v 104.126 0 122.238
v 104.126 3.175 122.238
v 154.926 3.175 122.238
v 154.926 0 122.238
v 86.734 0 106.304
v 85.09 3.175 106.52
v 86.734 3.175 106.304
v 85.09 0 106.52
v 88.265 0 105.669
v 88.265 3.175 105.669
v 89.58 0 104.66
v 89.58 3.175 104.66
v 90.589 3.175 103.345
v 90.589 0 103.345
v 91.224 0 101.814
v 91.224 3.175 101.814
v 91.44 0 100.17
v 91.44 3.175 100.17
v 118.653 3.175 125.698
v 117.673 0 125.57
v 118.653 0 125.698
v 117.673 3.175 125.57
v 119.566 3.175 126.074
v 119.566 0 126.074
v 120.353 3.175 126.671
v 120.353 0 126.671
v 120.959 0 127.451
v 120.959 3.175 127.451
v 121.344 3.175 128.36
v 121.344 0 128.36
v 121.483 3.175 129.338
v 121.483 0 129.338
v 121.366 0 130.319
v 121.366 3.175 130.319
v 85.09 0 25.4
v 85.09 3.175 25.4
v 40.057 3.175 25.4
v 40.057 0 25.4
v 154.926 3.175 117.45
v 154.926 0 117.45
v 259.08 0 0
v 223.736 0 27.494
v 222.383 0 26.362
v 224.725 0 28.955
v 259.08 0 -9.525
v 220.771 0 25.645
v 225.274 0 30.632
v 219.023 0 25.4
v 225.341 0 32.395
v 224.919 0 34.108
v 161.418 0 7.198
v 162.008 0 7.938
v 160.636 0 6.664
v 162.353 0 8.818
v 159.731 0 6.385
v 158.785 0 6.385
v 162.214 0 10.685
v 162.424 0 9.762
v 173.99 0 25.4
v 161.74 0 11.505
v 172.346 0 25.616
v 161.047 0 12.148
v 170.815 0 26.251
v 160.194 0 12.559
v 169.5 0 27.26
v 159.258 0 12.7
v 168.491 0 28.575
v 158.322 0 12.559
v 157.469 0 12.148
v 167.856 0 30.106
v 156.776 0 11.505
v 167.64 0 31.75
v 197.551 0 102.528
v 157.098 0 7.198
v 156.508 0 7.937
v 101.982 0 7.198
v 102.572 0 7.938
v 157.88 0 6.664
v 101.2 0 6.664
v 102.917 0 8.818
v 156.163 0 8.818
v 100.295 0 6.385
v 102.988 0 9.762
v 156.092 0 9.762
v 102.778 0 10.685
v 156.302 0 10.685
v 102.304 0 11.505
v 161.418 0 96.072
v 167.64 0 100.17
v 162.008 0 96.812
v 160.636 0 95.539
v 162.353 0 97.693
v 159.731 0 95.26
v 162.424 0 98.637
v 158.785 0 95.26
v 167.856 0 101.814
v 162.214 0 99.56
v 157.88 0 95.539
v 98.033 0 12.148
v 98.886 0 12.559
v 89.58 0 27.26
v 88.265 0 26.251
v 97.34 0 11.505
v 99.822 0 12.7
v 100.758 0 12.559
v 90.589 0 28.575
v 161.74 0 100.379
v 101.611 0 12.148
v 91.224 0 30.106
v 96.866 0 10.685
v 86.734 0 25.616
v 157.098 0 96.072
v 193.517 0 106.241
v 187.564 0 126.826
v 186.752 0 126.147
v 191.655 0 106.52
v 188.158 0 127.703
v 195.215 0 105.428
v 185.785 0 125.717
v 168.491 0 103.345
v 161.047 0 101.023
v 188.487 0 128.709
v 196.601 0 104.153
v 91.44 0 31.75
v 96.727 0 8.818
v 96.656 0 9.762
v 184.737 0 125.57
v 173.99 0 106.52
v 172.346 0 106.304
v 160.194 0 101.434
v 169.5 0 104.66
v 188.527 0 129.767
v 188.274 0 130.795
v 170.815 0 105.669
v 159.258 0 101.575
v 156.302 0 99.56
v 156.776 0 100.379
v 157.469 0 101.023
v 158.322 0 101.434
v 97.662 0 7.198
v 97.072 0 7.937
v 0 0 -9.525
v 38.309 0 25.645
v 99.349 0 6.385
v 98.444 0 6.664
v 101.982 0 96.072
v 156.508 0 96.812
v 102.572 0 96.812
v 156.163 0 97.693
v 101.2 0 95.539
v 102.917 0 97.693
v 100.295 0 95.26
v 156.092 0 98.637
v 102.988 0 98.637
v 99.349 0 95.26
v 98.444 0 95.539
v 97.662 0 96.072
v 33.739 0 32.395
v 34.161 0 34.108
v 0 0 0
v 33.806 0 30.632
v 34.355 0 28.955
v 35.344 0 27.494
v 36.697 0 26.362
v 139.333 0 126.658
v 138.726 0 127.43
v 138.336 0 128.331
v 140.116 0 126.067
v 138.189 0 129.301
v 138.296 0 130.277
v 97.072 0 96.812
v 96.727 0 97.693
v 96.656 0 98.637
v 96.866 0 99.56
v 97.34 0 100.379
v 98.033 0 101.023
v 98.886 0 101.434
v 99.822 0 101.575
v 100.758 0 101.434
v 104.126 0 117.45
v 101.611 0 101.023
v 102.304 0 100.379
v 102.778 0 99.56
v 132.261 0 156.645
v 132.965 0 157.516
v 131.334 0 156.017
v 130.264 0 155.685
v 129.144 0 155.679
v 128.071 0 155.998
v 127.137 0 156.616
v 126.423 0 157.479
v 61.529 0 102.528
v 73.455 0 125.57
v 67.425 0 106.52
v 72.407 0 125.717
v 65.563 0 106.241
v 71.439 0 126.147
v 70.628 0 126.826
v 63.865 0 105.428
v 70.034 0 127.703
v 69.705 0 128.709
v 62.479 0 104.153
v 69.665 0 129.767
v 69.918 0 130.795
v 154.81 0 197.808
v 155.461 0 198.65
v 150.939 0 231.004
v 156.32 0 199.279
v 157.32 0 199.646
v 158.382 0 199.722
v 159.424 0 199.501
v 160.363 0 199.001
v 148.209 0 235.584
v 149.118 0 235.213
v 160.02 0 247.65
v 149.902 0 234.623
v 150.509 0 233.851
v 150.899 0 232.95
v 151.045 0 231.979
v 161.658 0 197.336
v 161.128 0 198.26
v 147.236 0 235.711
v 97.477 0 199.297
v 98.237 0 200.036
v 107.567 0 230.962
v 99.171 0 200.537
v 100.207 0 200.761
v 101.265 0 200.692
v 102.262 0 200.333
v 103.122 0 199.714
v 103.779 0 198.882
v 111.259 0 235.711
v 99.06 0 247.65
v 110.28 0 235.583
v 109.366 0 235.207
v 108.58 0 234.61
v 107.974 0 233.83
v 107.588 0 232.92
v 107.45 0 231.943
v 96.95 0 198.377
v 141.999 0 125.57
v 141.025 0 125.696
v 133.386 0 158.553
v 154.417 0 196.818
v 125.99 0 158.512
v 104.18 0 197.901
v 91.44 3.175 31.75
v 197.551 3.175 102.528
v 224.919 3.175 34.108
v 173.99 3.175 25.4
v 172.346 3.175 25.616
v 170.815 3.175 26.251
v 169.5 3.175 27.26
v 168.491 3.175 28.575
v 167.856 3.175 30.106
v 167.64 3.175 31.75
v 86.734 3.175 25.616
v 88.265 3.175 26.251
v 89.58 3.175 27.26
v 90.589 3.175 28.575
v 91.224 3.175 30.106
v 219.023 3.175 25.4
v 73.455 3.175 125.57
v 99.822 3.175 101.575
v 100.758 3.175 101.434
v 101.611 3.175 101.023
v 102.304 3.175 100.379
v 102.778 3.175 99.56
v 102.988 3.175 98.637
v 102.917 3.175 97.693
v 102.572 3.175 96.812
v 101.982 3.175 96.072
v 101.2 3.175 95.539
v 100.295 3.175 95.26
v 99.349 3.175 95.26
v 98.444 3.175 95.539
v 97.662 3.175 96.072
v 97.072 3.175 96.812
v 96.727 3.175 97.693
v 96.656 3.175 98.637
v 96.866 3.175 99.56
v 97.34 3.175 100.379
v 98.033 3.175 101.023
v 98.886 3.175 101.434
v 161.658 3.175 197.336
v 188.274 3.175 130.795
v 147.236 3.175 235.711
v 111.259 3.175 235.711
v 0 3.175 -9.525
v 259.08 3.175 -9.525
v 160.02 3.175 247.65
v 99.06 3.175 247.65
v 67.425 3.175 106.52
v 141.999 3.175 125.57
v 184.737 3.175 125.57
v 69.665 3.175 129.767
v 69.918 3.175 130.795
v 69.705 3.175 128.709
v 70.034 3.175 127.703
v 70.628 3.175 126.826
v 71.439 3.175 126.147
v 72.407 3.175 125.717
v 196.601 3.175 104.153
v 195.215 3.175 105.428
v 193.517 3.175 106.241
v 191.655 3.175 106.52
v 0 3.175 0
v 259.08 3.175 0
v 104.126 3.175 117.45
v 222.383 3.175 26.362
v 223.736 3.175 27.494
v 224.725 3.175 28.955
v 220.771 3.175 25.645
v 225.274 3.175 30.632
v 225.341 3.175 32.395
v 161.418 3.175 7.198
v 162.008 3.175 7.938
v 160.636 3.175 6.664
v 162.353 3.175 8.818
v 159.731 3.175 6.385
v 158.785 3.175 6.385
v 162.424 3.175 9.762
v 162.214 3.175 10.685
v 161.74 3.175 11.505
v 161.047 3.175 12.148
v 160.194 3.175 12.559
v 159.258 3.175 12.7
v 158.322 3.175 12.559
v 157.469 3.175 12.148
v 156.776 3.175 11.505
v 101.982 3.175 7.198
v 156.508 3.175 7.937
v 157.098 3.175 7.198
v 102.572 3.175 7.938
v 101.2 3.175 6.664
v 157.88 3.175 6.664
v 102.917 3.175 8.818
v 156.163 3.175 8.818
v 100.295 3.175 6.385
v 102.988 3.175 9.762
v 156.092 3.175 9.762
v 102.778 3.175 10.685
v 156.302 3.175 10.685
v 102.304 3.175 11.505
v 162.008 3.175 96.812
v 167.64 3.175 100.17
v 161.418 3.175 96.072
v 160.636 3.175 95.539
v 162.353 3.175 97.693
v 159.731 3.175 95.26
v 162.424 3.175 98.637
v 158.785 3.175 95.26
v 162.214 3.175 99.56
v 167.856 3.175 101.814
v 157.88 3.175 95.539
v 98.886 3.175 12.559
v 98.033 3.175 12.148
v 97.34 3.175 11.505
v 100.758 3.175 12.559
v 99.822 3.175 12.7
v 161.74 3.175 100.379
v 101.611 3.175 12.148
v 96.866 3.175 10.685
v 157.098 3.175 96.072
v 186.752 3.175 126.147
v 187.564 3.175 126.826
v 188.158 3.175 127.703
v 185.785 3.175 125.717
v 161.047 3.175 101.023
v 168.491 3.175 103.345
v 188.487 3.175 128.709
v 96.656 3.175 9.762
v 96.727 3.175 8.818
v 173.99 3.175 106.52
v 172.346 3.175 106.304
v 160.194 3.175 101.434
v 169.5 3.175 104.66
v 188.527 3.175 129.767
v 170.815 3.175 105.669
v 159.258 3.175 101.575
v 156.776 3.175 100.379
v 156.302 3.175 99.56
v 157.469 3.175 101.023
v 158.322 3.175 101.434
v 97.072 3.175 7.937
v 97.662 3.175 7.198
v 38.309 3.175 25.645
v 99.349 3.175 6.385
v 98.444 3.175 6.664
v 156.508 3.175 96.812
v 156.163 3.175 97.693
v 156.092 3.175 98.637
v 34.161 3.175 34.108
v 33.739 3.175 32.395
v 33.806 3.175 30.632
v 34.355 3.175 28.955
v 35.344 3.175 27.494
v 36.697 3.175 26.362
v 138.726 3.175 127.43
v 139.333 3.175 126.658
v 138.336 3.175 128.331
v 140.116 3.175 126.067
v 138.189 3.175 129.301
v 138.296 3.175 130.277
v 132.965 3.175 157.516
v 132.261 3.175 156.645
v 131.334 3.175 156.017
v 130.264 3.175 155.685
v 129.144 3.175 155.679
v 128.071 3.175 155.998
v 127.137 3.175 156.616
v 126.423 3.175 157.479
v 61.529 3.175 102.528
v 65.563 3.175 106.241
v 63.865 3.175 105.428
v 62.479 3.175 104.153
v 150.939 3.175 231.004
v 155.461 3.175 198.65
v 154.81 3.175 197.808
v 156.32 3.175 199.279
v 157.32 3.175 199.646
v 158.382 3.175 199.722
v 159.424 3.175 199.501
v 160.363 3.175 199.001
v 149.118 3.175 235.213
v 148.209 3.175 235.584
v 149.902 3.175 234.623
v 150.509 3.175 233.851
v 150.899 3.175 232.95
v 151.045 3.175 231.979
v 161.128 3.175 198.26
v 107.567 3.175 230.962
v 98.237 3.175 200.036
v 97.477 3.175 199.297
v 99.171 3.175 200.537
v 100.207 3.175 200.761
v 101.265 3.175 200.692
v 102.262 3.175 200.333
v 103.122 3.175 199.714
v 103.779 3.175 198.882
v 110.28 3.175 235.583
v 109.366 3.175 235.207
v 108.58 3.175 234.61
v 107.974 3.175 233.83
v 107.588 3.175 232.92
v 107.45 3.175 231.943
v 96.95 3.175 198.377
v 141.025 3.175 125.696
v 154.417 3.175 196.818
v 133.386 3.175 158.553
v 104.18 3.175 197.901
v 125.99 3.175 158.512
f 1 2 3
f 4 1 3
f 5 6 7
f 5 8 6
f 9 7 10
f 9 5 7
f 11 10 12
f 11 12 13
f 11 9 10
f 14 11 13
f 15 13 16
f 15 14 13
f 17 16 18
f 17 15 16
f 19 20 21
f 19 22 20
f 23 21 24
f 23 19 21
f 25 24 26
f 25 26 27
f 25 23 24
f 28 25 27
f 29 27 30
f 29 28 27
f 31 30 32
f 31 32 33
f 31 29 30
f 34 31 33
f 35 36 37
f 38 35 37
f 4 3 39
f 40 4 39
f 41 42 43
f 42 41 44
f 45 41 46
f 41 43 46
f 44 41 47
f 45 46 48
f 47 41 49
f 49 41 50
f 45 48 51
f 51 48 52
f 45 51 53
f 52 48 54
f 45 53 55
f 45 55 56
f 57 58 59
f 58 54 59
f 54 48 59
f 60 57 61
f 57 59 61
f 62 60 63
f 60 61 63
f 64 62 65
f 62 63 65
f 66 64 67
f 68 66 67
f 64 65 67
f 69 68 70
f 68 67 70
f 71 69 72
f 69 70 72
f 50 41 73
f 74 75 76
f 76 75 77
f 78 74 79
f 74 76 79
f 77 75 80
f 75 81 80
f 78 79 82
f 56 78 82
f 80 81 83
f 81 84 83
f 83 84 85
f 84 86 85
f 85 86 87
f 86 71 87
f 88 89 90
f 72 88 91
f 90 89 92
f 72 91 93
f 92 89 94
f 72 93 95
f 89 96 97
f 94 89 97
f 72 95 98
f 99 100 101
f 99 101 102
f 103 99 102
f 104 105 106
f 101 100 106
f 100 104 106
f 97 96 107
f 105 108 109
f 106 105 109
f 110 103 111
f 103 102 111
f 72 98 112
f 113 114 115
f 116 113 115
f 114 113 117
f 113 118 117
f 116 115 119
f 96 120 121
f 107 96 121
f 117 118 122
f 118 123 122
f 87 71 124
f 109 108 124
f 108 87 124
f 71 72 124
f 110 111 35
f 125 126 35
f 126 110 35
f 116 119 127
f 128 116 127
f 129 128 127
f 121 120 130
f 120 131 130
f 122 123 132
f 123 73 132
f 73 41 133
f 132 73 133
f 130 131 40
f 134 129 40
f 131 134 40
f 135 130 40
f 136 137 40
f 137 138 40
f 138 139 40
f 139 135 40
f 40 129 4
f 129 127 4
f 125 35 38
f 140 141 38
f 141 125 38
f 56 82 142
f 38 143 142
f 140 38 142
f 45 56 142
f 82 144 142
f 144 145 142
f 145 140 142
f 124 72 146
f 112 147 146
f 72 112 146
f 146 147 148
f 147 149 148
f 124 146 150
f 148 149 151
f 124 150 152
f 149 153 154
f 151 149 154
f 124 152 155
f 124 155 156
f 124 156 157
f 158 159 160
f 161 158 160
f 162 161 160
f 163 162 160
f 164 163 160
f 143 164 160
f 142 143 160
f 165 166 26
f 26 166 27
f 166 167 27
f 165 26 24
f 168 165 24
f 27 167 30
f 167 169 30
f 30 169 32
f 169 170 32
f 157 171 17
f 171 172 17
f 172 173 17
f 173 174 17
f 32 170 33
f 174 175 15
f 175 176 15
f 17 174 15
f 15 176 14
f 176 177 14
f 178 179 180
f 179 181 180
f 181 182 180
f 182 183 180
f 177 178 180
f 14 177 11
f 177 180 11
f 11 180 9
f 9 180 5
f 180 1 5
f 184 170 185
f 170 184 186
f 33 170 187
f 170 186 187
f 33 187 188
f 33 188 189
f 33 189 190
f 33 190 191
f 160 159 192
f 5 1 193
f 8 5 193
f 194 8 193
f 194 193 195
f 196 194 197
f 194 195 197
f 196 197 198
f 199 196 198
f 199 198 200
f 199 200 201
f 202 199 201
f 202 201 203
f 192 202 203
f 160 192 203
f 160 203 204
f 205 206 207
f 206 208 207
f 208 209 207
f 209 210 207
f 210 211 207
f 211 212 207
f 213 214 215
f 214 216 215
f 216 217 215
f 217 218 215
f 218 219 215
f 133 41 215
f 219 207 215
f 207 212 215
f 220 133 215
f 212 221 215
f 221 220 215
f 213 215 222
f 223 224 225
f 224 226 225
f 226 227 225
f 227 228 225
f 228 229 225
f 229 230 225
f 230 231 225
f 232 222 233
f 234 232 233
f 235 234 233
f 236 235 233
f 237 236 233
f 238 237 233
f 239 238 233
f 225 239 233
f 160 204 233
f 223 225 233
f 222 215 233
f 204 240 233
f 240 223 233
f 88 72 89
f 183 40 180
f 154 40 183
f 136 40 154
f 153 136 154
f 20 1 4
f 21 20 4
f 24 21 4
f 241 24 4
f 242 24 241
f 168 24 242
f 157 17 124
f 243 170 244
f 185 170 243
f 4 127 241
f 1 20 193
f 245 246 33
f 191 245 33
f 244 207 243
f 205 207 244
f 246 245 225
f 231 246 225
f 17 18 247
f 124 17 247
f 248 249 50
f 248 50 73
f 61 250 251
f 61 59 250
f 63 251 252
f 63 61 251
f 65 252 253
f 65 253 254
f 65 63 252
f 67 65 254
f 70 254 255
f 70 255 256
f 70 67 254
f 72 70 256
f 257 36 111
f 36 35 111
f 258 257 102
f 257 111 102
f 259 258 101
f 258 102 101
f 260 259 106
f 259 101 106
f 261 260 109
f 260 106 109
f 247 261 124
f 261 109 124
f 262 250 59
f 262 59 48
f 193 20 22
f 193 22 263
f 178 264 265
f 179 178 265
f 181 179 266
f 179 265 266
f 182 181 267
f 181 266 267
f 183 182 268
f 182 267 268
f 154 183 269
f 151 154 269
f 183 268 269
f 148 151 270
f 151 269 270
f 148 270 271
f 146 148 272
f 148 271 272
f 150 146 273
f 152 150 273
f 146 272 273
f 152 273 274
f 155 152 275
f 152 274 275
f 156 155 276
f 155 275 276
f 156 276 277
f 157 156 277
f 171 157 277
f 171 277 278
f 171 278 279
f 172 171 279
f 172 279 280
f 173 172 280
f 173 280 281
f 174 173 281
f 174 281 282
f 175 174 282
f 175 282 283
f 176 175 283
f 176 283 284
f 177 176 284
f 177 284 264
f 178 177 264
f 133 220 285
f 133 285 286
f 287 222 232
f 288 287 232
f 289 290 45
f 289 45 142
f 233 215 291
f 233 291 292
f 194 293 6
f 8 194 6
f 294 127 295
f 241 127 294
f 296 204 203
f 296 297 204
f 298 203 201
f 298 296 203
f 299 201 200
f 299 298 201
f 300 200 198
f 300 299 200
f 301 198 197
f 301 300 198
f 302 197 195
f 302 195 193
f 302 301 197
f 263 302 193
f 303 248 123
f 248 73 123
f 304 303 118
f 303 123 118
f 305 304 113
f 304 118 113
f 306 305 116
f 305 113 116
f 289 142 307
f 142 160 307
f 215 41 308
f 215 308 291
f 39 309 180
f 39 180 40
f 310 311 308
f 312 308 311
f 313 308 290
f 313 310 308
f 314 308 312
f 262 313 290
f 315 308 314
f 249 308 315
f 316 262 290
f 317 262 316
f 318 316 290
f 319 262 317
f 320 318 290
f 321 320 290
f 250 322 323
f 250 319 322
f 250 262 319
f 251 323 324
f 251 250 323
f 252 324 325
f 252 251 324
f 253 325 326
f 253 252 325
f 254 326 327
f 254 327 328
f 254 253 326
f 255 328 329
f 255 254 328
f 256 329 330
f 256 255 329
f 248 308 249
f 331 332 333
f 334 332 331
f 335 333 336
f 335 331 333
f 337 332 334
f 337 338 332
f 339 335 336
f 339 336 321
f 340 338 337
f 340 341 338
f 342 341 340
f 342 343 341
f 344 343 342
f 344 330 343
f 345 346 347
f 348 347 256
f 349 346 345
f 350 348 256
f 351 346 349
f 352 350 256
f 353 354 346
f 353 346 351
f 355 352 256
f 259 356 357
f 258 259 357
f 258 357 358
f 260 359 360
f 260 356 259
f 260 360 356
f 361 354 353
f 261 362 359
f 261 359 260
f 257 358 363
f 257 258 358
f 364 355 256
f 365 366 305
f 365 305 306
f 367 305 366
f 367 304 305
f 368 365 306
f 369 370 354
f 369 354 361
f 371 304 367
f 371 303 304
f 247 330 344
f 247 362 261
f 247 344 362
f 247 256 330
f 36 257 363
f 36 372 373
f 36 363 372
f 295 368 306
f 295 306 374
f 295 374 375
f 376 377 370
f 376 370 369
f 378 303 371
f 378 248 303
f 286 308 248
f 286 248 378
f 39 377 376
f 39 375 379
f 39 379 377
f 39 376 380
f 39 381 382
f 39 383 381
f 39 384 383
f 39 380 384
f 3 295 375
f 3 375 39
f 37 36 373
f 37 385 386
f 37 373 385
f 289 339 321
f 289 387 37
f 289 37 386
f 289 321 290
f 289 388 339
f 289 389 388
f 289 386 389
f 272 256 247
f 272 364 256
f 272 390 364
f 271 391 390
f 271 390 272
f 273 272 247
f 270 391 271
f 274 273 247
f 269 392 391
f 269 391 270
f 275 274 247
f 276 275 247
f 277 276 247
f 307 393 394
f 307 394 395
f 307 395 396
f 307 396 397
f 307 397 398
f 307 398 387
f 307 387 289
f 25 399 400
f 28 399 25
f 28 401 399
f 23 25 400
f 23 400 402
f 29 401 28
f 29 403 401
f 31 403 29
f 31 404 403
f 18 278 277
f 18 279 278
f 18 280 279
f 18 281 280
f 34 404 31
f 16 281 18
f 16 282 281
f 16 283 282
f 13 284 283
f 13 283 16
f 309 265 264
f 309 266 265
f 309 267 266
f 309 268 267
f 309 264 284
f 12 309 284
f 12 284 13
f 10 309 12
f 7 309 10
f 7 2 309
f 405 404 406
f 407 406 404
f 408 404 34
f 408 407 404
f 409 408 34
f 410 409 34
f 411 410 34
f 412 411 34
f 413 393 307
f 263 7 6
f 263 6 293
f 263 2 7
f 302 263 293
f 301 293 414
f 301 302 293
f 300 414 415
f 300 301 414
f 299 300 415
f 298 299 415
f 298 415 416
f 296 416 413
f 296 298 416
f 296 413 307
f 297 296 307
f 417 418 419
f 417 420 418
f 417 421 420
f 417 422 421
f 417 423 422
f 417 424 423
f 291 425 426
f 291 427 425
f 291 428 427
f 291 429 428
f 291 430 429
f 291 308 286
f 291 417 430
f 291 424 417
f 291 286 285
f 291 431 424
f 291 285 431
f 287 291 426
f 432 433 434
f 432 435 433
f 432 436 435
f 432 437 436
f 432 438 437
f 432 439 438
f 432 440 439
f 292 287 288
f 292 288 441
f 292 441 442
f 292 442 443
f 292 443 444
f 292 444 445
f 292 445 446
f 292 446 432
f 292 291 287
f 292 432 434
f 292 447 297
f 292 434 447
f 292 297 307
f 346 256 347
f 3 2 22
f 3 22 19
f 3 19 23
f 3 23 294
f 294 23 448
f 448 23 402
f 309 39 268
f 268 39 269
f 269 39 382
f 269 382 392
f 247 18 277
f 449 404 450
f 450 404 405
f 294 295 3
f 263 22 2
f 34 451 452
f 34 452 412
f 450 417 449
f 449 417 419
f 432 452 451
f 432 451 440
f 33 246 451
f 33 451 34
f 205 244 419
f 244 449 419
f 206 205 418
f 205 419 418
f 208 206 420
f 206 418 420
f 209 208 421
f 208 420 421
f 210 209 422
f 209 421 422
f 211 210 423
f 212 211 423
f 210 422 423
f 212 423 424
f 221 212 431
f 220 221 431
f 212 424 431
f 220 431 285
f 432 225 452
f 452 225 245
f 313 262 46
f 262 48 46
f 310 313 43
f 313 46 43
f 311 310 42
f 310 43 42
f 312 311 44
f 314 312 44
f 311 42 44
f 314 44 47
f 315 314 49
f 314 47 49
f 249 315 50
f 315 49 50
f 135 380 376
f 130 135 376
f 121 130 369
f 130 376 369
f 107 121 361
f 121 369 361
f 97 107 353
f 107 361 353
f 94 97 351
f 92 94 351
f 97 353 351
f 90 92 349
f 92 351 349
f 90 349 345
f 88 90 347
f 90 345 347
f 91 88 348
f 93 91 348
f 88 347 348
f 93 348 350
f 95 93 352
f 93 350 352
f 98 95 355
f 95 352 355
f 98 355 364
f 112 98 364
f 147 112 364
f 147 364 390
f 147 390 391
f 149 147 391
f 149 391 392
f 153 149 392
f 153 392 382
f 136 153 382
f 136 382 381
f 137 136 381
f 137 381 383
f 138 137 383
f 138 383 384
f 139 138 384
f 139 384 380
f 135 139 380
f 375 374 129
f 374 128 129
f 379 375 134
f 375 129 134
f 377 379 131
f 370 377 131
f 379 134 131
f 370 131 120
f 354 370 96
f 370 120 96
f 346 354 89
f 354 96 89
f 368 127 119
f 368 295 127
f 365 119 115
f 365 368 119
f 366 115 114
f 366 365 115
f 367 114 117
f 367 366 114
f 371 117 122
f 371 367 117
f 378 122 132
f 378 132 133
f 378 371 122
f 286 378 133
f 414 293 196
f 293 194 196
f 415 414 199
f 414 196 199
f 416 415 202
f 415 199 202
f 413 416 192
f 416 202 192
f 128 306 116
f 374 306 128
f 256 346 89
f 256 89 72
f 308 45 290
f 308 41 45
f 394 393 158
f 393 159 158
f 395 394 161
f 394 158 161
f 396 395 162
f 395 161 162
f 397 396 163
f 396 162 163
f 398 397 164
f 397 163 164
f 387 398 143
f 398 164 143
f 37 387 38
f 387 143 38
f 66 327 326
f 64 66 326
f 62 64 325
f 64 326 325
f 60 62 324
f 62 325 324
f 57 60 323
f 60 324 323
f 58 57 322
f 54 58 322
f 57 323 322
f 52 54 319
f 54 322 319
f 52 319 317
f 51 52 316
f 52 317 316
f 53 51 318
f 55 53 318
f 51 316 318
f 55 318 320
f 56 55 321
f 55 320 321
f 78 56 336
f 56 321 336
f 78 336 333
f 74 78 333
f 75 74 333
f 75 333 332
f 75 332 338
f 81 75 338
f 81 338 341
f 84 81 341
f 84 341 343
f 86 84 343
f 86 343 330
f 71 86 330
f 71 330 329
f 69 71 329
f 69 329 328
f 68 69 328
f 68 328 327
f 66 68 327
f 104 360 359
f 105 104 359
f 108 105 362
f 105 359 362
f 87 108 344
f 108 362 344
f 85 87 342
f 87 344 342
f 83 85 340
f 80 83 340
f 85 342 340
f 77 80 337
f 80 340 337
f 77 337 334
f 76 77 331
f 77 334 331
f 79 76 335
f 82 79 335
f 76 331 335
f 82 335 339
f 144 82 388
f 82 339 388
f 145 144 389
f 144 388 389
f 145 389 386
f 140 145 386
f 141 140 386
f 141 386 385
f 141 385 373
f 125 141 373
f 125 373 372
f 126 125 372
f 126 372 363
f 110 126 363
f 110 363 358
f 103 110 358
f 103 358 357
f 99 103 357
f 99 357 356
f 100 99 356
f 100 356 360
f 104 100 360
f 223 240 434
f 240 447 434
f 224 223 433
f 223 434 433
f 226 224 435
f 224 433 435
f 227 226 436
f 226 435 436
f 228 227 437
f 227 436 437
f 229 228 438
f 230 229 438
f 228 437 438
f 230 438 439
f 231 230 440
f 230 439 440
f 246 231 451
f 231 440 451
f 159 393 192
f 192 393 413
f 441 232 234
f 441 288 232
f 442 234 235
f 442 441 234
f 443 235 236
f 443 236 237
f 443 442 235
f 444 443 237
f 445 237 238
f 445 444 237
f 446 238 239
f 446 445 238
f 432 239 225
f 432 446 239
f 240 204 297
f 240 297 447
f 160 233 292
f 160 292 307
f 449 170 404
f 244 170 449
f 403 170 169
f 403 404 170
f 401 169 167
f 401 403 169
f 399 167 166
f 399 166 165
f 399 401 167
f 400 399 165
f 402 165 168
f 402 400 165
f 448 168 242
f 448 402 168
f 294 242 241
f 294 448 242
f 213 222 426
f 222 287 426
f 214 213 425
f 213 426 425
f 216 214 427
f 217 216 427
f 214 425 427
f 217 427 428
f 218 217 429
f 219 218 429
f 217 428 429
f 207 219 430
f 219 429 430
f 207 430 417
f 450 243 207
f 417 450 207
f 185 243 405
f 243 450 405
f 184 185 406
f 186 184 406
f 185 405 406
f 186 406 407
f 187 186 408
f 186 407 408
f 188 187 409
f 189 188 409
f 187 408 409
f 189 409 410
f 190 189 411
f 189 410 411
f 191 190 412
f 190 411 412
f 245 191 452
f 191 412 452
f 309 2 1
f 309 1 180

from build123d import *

# Parameters (mm, degrees)
BOSS_EXTRUDE1_DEPTH = 3.175
FILLET1_R           = 3.81
CUT_EXTRUDE1_DEPTH  = 3.175
FILLET2_R           = 6.35
SKETCH5_W           = 259.08
SKETCH5_H           = 3.175
BOSS_EXTRUDE2_DEPTH = 4.7625
CUT_EXTRUDE2_REACH  = 360.417
SKETCH6_W           = 50.8
SKETCH6_H           = 4.7879
SKETCH9_W           = 259.08
SKETCH9_H           = 3.175
BOSS_EXTRUDE3_DEPTH = 4.7625
SKETCH10_R          = 3.175
CUT_EXTRUDE4_DEPTH  = 359.417423579


with BuildPart() as part:
    # Sketch2 → Boss-Extrude1 (new body)
    with BuildSketch(Plane(origin=(0, 0, 0), x_dir=(1, 0, 0), z_dir=(0, 1, 0))):
        Polygon((0, 0), (259.08, 0), (160.02, -247.65), (99.06, -247.65), align=None)
        Polygon((152.079282437, -235.710784307), (106.359282437, -235.710784307), (129.772405457, -143.63904611), align=None, mode=Mode.SUBTRACT)
        Polygon((101.296371264, -209.241791453), (122.57344543, -125.570031796), (67.827667402, -125.570031796), align=None, mode=Mode.SUBTRACT)
        Polygon((157.226545347, -208.413887274), (190.364087539, -125.570031796), (137.155373359, -125.570031796), align=None, mode=Mode.SUBTRACT)
    extrude(amount=BOSS_EXTRUDE1_DEPTH)

    # Fillet1
    fillet1_edges = [part.edges().sort_by_distance(p)[0] for p in [
        (152.079282437, 1.5875, 235.710784307),
        (129.772405457, 1.5875, 143.63904611),
        (106.359282437, 1.5875, 235.710784307),
        (67.827667402, 1.5875, 125.570031796),
        (101.296371264, 1.5875, 209.241791453),
        (122.57344543, 1.5875, 125.570031796),
        (137.155373359, 1.5875, 125.570031796),
        (157.226545347, 1.5875, 208.413887274),
        (190.364087539, 1.5875, 125.570031796),
    ]]
    fillet(fillet1_edges, radius=FILLET1_R)

    # Sketch3 → Cut-Extrude1 (cut)
    with BuildSketch(Plane(origin=(0, 3.175, 0), x_dir=(1, 0, 0), z_dir=(0, 1, 0))):
        Polygon((167.64, -25.4), (228.402522085, -25.4), (195.954509366, -106.520031796), (167.64, -106.520031796), align=None)
        Polygon((91.44, -106.520031796), (91.44, -25.4), (30.677477915, -25.4), (63.125490634, -106.520031796), align=None)
    extrude(amount=-CUT_EXTRUDE1_DEPTH, mode=Mode.SUBTRACT)

    # Fillet2
    fillet2_edges = [part.edges().sort_by_distance(p)[0] for p in [
        (195.954509366, 1.5875, 106.520031796),
        (228.402522085, 1.5875, 25.4),
        (167.64, 1.5875, 25.4),
        (167.64, 1.5875, 106.520031796),
        (91.44, 1.5875, 25.4),
        (30.677477915, 1.5875, 25.4),
        (63.125490634, 1.5875, 106.520031796),
        (91.44, 1.5875, 106.520031796),
    ]]
    fillet(fillet2_edges, radius=FILLET2_R)

    # Sketch5 → Boss-Extrude2 (add)
    with BuildSketch(Plane(origin=(0, 0, 0), x_dir=(-1, 0, 0), z_dir=(0, 0, -1))):
        with Locations((-129.54, 1.5875)):
            Rectangle(SKETCH5_W, SKETCH5_H)
    extrude(amount=BOSS_EXTRUDE2_DEPTH)

    # Sketch6 → Cut-Extrude2 (cut, up to next)
    with BuildSketch(Plane(origin=(0, 3.175, 0), x_dir=(1, 0, 0), z_dir=(0, 1, 0)), mode=Mode.PRIVATE) as cut_extrude2_sk1:
        with Locations((129.526089834, -119.84355)):
            Rectangle(SKETCH6_W, SKETCH6_H)
    cut_extrude2_tool1 = extrude(cut_extrude2_sk1.sketch, amount=-CUT_EXTRUDE2_REACH, mode=Mode.PRIVATE) & part.part
    add(cut_extrude2_tool1.solids().sort_by_distance((129.52609, 3.175, 119.84355))[0], mode=Mode.SUBTRACT)

    # Sketch9 → Boss-Extrude3 (add)
    with BuildSketch(Plane(origin=(0, 0, -4.7625), x_dir=(-1, 0, 0), z_dir=(0, 0, -1))):
        with Locations((-129.54, 1.5875)):
            Rectangle(SKETCH9_W, SKETCH9_H)
    extrude(amount=BOSS_EXTRUDE3_DEPTH)

    # Sketch10 → Cut-Extrude4 (cut, through all)
    with BuildSketch(Plane(origin=(0, 3.175, 0), x_dir=(1, 0, 0), z_dir=(0, 1, 0))):
        with Locations(Location((99.822, -98.3996, 0), (0, 0, 270))):
            Circle(SKETCH10_R)
        with Locations(Location((159.258, -98.3996, 0), (0, 0, 270))):
            Circle(SKETCH10_R)
        with Locations(Location((99.822, -9.525, 0), (0, 0, 270))):
            Circle(SKETCH10_R)
        with Locations(Location((159.258, -9.525, 0), (0, 0, 270))):
            Circle(SKETCH10_R)
    extrude(amount=-CUT_EXTRUDE4_DEPTH, mode=Mode.SUBTRACT)


solid = part.part
